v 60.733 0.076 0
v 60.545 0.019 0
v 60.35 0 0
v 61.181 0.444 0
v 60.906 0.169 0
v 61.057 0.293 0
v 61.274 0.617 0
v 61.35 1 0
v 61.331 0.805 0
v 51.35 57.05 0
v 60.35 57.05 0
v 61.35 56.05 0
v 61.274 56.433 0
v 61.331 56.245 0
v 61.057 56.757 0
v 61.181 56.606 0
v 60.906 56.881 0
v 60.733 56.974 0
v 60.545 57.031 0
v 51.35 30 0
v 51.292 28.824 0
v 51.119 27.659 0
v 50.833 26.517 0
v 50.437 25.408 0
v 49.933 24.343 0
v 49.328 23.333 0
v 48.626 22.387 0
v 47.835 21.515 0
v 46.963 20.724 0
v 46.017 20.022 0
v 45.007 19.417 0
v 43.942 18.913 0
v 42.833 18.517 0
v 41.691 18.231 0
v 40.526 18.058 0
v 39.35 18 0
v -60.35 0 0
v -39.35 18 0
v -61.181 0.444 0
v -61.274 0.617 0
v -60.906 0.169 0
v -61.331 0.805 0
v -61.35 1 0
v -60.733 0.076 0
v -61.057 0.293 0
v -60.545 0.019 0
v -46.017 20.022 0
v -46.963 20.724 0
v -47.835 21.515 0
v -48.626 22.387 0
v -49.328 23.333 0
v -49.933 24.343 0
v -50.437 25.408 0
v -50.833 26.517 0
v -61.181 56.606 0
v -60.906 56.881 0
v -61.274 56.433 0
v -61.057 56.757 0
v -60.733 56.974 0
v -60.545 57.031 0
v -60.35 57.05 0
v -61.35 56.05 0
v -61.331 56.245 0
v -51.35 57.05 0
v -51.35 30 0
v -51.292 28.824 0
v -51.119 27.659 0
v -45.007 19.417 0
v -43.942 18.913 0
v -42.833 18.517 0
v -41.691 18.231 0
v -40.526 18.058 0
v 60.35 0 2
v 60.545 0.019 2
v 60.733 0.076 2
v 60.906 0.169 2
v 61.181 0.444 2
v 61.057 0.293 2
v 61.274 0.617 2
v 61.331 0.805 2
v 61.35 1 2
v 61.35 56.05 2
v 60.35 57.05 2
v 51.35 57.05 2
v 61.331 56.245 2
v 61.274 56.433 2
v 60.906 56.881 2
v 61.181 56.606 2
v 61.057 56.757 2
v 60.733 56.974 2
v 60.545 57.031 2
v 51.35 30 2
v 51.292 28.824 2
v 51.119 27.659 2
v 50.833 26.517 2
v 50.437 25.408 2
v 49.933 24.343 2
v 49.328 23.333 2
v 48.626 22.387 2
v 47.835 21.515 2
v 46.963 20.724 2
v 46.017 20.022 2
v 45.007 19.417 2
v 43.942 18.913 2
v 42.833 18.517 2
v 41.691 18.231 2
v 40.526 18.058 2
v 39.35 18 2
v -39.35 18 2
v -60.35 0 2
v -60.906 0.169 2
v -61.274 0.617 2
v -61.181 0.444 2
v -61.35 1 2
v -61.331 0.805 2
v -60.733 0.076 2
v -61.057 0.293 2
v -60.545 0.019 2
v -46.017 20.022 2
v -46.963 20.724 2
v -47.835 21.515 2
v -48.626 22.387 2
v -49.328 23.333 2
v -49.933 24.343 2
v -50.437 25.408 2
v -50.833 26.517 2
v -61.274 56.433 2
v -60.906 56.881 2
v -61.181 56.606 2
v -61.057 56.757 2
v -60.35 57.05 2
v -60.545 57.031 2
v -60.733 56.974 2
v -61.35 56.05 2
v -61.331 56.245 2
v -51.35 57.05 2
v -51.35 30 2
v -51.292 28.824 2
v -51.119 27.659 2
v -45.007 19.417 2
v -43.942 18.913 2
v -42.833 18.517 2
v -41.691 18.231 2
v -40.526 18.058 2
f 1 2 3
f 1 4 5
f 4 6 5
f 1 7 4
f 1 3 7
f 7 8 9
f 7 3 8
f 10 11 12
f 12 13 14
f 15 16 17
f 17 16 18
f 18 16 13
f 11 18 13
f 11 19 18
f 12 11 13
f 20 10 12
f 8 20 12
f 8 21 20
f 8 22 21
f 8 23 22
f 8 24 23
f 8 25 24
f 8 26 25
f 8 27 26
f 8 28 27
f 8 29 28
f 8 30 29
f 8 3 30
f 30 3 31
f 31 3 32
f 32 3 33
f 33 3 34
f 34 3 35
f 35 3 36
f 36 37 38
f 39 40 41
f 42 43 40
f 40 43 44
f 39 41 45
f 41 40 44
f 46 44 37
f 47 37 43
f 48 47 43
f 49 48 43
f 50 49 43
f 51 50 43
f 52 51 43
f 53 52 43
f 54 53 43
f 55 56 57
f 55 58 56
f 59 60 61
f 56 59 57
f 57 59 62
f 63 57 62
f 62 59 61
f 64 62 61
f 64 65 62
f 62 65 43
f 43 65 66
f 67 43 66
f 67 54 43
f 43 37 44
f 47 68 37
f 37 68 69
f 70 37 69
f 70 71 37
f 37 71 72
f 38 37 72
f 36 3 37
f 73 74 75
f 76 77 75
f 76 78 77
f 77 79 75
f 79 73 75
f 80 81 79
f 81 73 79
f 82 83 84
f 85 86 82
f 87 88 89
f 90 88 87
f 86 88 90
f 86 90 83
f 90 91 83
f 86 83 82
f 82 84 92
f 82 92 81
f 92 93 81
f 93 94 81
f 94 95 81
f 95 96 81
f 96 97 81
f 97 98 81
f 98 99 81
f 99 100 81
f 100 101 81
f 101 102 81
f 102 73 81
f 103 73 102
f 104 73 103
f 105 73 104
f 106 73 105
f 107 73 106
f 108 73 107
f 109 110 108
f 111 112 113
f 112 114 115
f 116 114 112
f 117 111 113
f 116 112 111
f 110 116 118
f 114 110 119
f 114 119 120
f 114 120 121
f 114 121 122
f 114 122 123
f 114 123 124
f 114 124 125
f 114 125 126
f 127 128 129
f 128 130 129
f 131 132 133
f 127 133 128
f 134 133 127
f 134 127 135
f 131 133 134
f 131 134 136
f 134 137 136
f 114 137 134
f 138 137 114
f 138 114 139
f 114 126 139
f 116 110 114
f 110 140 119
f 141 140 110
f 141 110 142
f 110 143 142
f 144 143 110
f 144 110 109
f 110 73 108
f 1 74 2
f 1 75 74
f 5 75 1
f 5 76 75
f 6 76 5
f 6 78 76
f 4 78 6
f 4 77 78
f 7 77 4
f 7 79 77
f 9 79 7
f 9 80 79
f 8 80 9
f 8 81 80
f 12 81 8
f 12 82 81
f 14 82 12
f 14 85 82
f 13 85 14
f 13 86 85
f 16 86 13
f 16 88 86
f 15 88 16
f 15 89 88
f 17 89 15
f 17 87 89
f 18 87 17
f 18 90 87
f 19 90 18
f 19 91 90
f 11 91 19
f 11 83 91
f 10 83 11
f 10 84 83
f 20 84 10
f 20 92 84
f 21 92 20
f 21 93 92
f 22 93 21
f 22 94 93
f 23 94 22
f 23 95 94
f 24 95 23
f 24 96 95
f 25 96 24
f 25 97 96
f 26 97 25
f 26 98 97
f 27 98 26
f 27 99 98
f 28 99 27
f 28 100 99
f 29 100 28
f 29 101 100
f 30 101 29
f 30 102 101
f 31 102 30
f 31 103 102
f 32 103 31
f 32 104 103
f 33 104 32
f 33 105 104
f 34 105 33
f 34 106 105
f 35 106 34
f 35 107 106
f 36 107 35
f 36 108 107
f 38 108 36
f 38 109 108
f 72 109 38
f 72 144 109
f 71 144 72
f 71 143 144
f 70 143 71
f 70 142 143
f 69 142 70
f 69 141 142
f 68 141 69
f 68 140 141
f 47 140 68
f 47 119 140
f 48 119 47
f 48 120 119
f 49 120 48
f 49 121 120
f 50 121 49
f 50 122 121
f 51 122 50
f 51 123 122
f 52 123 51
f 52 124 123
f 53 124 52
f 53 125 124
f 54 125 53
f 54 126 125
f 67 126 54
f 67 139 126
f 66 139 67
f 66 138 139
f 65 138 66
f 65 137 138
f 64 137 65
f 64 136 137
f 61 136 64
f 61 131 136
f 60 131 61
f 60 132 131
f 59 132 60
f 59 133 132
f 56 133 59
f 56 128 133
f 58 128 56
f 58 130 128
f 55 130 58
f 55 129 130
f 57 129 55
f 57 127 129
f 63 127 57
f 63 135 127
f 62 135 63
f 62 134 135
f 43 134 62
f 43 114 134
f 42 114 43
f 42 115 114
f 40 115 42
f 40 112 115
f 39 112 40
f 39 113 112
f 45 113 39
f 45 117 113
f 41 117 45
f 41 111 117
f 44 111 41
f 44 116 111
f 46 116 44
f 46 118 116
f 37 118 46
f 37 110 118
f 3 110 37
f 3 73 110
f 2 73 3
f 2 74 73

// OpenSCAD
// file: ../../../../modules/gridfinity.scad
// Gridfinity ベースプレートの共有 module。
// 寸法は Gridfinity 仕様 (Zack Freedman) の baseplate 輪郭に従う:
//   ピッチ 42、ソケット上端開口 41.5 (角 R4)、上から 45° 面取り 2.15 →
//   垂直 1.8 (37.2 角・R1.85) → 45° 面取り 0.7 → 底 35.8 角 (R1.15)。
//   ソケット深さ = 2.15 + 1.8 + 0.7 = 4.65。
//
// 座標系: X が列方向 (中央が 0)、Y が行方向 (板の前端が 0)、Z=0 が板の底面。
// 板の外形は grid とは独立に rim で与えるので、grid より大きい板 (縁付き) を
// 作れる。ソケットは rim=[left, right, front, back] の内側へ 42 ピッチで並ぶ。

gf_pitch = 42;
gf_socket_top = 41.5; // 上端開口
gf_socket_mid = 37.2; // 垂直部
gf_socket_bot = 35.8; // 底
gf_socket_r_top = 4;
gf_socket_r_mid = 1.85;
gf_socket_r_bot = 1.15;
gf_chamfer_top = 2.15;
gf_wall_h = 1.8;
gf_chamfer_bot = 0.7;
gf_socket_depth = gf_chamfer_top + gf_wall_h + gf_chamfer_bot; // 4.65
gf_fn = 32;
gf_eps = 0.01; // hull 用の薄板の厚さ
gf_over = 0.5; // 切削の抜き代

// 角丸正方形または矩形 (w は一辺、または [幅, 奥行き]、角 R)
module
gf_rounded_square(w, r)
{
    offset(r = r, $fn = gf_fn)
        square(is_list(w) ? w - [ 2 * r, 2 * r ] : w - 2 * r, center = true);
}

// 厚さ gf_eps の角丸正方形の薄板を z に置く (hull の骨)
module
gf_slab(w, r, z)
{
    translate([ 0, 0, z ]) linear_extrude(gf_eps) gf_rounded_square(w, r);
}

// ソケット1個の切削体。z=0 がソケットの底 (床の天面)、+Z へ 4.65 で天面に出る。
// clearance は嵌合の逃げで、輪郭を全周へ clearance だけ外へ出す (幅 +2c、角 R
// +c)。pitch_x は X 方向のセル幅。端数でも角 R と面取りの寸法を保つ。
module
gf_socket_cut(clearance = 0, pitch_x = gf_pitch)
{
    z1 = gf_chamfer_bot;
    z2 = z1 + gf_wall_h;
    z3 = gf_socket_depth;
    c = clearance;
    assert(pitch_x > gf_pitch - gf_socket_top + 2 * gf_socket_r_top,
           "Cell width is too small for the socket corner radius");
    delta = [ pitch_x - gf_pitch, 0 ];
    bot = [ gf_socket_bot + 2 * c, gf_socket_bot + 2 * c ] + delta;
    mid = [ gf_socket_mid + 2 * c, gf_socket_mid + 2 * c ] + delta;
    top = [ gf_socket_top + 2 * c, gf_socket_top + 2 * c ] + delta;
    hull()
    {
        gf_slab(bot, gf_socket_r_bot + c, 0);
        gf_slab(mid, gf_socket_r_mid + c, z1 - gf_eps);
    }
    hull()
    {
        gf_slab(mid, gf_socket_r_mid + c, z1 - gf_eps);
        gf_slab(mid, gf_socket_r_mid + c, z2 - gf_eps);
    }
    hull()
    {
        gf_slab(mid, gf_socket_r_mid + c, z2 - gf_eps);
        gf_slab(top, gf_socket_r_top + c, z3 - gf_eps);
    }
    // 天面より上へ抜く (天面と同一平面の退化した面を残さない)
    gf_slab(top, gf_socket_r_top + c, z3 - gf_eps);
    translate([ 0, 0, z3 - gf_eps ]) linear_extrude(gf_over + gf_eps)
        gf_rounded_square(top, gf_socket_r_top + c);
}

// ベースプレート。cols x rows のソケットを床 floor_t の上に彫る。
// rim = [left, right, front, back] はソケット列の外側に残す縁の幅。
// 板の幅 = cols*42 + left + right、奥行き = rows*42 + front + back。
// cols の端数は左端の細幅セルになる。rows は正の整数。
// clearance はソケットの嵌合の逃げ (gf_socket_cut を参照)。
module
gf_baseplate(cols, rows, rim = [ 0, 0, 0, 0 ], floor_t = 1, clearance = 0)
{
    grid_w = cols * gf_pitch;
    grid_d = rows * gf_pitch;
    plate_w = grid_w + rim[0] + rim[1];
    plate_d = grid_d + rim[2] + rim[3];
    x0 = -plate_w / 2 + rim[0]; // ソケット列の左端
    first_pitch = grid_w - (ceil(cols) - 1) * gf_pitch;
    difference()
    {
        translate([ -plate_w / 2, 0, 0 ])
            cube([ plate_w, plate_d, floor_t + gf_socket_depth ]);
        for (c = [0:ceil(cols) - 1], r = [0:rows - 1])
            translate([
                x0 + (c == 0 ? first_pitch / 2
                             : first_pitch + (c - 0.5) * gf_pitch),
                rim[2] + (r + 0.5) * gf_pitch,
                floor_t
            ]) gf_socket_cut(clearance, c == 0 ? first_pitch : gf_pitch);
    }
}
// file: ../../../../modules/gridfinity_cable_holder.scad
include <gridfinity_bin.scad>

// 天馬用。STLの初期配置で横5.5マス、奥行rowsマス、左半セル。
gfc_cols = 5.5;
gfc_units = 9;
gfc_wall = 1.2;
gfc_floor_t = 1.2;
gfc_pitch = 10;
gfc_slot_count = 22;
gfc_plate_t = 2;
gfc_slot_clearance = 0.4; // 板厚に足す総量。実プリントで調整する
gfc_slot_depth = 2;
gfc_end_clearance = 0.2; // 板の前後端と溝底の片側の余裕
gfc_leg = 10;
gfc_notch_floor = 18;
gfc_notch_r = 12;

gfc_width = gfc_cols * gf_pitch - 0.5;
gfc_floor_top = gfb_base_h + gfc_floor_t;
gfc_top = gfc_units * gfb_unit + gfb_lip_h;
gfc_plate_h = gfc_units * gfb_unit - gfc_floor_top;

function gfc_depth(rows) = rows * gf_pitch - 0.5;
function gfc_divider_length(rows) =
    gfc_depth(rows) - 2 * (gfc_wall + gfc_end_clearance);

// ラベル棚は設けず、前後の補強壁の内側へ上端まで開いた溝を作る。
module gfc_holder(rows)
{
    depth = gfc_depth(rows);
    slot_w = gfc_plate_t + gfc_slot_clearance;
    difference()
    {
        union()
        {
            gfb_bin(gfc_cols, rows, gfc_units, gfc_wall, gfc_floor_t);
            intersection()
            {
                translate([ 0, 0, gfc_floor_top - gf_eps ])
                    linear_extrude(gfc_top - gfc_floor_top + gf_eps)
                        gfb_footprint(gfc_cols, rows);
                for (y = [ 0, depth - gfc_wall - gfc_slot_depth ])
                    translate([ -gfc_width / 2, y, gfc_floor_top - gf_eps ])
                        cube([ gfc_width, gfc_wall + gfc_slot_depth,
                               gfc_top - gfc_floor_top + gf_eps ]);
            }
        }
        for (i = [0:gfc_slot_count - 1], rear = [0:1])
            translate([
                (i - (gfc_slot_count - 1) / 2) * gfc_pitch - slot_w / 2,
                rear ? depth - gfc_wall - gfc_slot_depth - gf_over : gfc_wall,
                gfc_floor_top
            ]) cube([ slot_w, gfc_slot_depth + gf_over,
                      gfc_top - gfc_floor_top + gf_over ]);
    }
}

// 単品を平置きで印刷する。長辺が前後方向、高さ方向にU字を開ける。
// 組立時は床z=5.95に載り、板上端はz=63（リップより4.4mm低い）。
module gfc_divider(rows)
{
    length = gfc_divider_length(rows);
    linear_extrude(gfc_plate_t) difference()
    {
        translate([ 0, gfc_plate_h / 2 ])
            gf_rounded_square_wd(length, gfc_plate_h, 1);
        translate([ -length / 2 + gfc_leg + gfc_notch_r,
                    gfc_notch_floor + gfc_notch_r ])
            offset(r = gfc_notch_r, $fn = gf_fn * 2)
                square([ length - 2 * (gfc_leg + gfc_notch_r), gfc_plate_h ]);
    }
}
// main file
include <../../../../modules/gridfinity_cable_holder.scad>

gfc_divider(3);
